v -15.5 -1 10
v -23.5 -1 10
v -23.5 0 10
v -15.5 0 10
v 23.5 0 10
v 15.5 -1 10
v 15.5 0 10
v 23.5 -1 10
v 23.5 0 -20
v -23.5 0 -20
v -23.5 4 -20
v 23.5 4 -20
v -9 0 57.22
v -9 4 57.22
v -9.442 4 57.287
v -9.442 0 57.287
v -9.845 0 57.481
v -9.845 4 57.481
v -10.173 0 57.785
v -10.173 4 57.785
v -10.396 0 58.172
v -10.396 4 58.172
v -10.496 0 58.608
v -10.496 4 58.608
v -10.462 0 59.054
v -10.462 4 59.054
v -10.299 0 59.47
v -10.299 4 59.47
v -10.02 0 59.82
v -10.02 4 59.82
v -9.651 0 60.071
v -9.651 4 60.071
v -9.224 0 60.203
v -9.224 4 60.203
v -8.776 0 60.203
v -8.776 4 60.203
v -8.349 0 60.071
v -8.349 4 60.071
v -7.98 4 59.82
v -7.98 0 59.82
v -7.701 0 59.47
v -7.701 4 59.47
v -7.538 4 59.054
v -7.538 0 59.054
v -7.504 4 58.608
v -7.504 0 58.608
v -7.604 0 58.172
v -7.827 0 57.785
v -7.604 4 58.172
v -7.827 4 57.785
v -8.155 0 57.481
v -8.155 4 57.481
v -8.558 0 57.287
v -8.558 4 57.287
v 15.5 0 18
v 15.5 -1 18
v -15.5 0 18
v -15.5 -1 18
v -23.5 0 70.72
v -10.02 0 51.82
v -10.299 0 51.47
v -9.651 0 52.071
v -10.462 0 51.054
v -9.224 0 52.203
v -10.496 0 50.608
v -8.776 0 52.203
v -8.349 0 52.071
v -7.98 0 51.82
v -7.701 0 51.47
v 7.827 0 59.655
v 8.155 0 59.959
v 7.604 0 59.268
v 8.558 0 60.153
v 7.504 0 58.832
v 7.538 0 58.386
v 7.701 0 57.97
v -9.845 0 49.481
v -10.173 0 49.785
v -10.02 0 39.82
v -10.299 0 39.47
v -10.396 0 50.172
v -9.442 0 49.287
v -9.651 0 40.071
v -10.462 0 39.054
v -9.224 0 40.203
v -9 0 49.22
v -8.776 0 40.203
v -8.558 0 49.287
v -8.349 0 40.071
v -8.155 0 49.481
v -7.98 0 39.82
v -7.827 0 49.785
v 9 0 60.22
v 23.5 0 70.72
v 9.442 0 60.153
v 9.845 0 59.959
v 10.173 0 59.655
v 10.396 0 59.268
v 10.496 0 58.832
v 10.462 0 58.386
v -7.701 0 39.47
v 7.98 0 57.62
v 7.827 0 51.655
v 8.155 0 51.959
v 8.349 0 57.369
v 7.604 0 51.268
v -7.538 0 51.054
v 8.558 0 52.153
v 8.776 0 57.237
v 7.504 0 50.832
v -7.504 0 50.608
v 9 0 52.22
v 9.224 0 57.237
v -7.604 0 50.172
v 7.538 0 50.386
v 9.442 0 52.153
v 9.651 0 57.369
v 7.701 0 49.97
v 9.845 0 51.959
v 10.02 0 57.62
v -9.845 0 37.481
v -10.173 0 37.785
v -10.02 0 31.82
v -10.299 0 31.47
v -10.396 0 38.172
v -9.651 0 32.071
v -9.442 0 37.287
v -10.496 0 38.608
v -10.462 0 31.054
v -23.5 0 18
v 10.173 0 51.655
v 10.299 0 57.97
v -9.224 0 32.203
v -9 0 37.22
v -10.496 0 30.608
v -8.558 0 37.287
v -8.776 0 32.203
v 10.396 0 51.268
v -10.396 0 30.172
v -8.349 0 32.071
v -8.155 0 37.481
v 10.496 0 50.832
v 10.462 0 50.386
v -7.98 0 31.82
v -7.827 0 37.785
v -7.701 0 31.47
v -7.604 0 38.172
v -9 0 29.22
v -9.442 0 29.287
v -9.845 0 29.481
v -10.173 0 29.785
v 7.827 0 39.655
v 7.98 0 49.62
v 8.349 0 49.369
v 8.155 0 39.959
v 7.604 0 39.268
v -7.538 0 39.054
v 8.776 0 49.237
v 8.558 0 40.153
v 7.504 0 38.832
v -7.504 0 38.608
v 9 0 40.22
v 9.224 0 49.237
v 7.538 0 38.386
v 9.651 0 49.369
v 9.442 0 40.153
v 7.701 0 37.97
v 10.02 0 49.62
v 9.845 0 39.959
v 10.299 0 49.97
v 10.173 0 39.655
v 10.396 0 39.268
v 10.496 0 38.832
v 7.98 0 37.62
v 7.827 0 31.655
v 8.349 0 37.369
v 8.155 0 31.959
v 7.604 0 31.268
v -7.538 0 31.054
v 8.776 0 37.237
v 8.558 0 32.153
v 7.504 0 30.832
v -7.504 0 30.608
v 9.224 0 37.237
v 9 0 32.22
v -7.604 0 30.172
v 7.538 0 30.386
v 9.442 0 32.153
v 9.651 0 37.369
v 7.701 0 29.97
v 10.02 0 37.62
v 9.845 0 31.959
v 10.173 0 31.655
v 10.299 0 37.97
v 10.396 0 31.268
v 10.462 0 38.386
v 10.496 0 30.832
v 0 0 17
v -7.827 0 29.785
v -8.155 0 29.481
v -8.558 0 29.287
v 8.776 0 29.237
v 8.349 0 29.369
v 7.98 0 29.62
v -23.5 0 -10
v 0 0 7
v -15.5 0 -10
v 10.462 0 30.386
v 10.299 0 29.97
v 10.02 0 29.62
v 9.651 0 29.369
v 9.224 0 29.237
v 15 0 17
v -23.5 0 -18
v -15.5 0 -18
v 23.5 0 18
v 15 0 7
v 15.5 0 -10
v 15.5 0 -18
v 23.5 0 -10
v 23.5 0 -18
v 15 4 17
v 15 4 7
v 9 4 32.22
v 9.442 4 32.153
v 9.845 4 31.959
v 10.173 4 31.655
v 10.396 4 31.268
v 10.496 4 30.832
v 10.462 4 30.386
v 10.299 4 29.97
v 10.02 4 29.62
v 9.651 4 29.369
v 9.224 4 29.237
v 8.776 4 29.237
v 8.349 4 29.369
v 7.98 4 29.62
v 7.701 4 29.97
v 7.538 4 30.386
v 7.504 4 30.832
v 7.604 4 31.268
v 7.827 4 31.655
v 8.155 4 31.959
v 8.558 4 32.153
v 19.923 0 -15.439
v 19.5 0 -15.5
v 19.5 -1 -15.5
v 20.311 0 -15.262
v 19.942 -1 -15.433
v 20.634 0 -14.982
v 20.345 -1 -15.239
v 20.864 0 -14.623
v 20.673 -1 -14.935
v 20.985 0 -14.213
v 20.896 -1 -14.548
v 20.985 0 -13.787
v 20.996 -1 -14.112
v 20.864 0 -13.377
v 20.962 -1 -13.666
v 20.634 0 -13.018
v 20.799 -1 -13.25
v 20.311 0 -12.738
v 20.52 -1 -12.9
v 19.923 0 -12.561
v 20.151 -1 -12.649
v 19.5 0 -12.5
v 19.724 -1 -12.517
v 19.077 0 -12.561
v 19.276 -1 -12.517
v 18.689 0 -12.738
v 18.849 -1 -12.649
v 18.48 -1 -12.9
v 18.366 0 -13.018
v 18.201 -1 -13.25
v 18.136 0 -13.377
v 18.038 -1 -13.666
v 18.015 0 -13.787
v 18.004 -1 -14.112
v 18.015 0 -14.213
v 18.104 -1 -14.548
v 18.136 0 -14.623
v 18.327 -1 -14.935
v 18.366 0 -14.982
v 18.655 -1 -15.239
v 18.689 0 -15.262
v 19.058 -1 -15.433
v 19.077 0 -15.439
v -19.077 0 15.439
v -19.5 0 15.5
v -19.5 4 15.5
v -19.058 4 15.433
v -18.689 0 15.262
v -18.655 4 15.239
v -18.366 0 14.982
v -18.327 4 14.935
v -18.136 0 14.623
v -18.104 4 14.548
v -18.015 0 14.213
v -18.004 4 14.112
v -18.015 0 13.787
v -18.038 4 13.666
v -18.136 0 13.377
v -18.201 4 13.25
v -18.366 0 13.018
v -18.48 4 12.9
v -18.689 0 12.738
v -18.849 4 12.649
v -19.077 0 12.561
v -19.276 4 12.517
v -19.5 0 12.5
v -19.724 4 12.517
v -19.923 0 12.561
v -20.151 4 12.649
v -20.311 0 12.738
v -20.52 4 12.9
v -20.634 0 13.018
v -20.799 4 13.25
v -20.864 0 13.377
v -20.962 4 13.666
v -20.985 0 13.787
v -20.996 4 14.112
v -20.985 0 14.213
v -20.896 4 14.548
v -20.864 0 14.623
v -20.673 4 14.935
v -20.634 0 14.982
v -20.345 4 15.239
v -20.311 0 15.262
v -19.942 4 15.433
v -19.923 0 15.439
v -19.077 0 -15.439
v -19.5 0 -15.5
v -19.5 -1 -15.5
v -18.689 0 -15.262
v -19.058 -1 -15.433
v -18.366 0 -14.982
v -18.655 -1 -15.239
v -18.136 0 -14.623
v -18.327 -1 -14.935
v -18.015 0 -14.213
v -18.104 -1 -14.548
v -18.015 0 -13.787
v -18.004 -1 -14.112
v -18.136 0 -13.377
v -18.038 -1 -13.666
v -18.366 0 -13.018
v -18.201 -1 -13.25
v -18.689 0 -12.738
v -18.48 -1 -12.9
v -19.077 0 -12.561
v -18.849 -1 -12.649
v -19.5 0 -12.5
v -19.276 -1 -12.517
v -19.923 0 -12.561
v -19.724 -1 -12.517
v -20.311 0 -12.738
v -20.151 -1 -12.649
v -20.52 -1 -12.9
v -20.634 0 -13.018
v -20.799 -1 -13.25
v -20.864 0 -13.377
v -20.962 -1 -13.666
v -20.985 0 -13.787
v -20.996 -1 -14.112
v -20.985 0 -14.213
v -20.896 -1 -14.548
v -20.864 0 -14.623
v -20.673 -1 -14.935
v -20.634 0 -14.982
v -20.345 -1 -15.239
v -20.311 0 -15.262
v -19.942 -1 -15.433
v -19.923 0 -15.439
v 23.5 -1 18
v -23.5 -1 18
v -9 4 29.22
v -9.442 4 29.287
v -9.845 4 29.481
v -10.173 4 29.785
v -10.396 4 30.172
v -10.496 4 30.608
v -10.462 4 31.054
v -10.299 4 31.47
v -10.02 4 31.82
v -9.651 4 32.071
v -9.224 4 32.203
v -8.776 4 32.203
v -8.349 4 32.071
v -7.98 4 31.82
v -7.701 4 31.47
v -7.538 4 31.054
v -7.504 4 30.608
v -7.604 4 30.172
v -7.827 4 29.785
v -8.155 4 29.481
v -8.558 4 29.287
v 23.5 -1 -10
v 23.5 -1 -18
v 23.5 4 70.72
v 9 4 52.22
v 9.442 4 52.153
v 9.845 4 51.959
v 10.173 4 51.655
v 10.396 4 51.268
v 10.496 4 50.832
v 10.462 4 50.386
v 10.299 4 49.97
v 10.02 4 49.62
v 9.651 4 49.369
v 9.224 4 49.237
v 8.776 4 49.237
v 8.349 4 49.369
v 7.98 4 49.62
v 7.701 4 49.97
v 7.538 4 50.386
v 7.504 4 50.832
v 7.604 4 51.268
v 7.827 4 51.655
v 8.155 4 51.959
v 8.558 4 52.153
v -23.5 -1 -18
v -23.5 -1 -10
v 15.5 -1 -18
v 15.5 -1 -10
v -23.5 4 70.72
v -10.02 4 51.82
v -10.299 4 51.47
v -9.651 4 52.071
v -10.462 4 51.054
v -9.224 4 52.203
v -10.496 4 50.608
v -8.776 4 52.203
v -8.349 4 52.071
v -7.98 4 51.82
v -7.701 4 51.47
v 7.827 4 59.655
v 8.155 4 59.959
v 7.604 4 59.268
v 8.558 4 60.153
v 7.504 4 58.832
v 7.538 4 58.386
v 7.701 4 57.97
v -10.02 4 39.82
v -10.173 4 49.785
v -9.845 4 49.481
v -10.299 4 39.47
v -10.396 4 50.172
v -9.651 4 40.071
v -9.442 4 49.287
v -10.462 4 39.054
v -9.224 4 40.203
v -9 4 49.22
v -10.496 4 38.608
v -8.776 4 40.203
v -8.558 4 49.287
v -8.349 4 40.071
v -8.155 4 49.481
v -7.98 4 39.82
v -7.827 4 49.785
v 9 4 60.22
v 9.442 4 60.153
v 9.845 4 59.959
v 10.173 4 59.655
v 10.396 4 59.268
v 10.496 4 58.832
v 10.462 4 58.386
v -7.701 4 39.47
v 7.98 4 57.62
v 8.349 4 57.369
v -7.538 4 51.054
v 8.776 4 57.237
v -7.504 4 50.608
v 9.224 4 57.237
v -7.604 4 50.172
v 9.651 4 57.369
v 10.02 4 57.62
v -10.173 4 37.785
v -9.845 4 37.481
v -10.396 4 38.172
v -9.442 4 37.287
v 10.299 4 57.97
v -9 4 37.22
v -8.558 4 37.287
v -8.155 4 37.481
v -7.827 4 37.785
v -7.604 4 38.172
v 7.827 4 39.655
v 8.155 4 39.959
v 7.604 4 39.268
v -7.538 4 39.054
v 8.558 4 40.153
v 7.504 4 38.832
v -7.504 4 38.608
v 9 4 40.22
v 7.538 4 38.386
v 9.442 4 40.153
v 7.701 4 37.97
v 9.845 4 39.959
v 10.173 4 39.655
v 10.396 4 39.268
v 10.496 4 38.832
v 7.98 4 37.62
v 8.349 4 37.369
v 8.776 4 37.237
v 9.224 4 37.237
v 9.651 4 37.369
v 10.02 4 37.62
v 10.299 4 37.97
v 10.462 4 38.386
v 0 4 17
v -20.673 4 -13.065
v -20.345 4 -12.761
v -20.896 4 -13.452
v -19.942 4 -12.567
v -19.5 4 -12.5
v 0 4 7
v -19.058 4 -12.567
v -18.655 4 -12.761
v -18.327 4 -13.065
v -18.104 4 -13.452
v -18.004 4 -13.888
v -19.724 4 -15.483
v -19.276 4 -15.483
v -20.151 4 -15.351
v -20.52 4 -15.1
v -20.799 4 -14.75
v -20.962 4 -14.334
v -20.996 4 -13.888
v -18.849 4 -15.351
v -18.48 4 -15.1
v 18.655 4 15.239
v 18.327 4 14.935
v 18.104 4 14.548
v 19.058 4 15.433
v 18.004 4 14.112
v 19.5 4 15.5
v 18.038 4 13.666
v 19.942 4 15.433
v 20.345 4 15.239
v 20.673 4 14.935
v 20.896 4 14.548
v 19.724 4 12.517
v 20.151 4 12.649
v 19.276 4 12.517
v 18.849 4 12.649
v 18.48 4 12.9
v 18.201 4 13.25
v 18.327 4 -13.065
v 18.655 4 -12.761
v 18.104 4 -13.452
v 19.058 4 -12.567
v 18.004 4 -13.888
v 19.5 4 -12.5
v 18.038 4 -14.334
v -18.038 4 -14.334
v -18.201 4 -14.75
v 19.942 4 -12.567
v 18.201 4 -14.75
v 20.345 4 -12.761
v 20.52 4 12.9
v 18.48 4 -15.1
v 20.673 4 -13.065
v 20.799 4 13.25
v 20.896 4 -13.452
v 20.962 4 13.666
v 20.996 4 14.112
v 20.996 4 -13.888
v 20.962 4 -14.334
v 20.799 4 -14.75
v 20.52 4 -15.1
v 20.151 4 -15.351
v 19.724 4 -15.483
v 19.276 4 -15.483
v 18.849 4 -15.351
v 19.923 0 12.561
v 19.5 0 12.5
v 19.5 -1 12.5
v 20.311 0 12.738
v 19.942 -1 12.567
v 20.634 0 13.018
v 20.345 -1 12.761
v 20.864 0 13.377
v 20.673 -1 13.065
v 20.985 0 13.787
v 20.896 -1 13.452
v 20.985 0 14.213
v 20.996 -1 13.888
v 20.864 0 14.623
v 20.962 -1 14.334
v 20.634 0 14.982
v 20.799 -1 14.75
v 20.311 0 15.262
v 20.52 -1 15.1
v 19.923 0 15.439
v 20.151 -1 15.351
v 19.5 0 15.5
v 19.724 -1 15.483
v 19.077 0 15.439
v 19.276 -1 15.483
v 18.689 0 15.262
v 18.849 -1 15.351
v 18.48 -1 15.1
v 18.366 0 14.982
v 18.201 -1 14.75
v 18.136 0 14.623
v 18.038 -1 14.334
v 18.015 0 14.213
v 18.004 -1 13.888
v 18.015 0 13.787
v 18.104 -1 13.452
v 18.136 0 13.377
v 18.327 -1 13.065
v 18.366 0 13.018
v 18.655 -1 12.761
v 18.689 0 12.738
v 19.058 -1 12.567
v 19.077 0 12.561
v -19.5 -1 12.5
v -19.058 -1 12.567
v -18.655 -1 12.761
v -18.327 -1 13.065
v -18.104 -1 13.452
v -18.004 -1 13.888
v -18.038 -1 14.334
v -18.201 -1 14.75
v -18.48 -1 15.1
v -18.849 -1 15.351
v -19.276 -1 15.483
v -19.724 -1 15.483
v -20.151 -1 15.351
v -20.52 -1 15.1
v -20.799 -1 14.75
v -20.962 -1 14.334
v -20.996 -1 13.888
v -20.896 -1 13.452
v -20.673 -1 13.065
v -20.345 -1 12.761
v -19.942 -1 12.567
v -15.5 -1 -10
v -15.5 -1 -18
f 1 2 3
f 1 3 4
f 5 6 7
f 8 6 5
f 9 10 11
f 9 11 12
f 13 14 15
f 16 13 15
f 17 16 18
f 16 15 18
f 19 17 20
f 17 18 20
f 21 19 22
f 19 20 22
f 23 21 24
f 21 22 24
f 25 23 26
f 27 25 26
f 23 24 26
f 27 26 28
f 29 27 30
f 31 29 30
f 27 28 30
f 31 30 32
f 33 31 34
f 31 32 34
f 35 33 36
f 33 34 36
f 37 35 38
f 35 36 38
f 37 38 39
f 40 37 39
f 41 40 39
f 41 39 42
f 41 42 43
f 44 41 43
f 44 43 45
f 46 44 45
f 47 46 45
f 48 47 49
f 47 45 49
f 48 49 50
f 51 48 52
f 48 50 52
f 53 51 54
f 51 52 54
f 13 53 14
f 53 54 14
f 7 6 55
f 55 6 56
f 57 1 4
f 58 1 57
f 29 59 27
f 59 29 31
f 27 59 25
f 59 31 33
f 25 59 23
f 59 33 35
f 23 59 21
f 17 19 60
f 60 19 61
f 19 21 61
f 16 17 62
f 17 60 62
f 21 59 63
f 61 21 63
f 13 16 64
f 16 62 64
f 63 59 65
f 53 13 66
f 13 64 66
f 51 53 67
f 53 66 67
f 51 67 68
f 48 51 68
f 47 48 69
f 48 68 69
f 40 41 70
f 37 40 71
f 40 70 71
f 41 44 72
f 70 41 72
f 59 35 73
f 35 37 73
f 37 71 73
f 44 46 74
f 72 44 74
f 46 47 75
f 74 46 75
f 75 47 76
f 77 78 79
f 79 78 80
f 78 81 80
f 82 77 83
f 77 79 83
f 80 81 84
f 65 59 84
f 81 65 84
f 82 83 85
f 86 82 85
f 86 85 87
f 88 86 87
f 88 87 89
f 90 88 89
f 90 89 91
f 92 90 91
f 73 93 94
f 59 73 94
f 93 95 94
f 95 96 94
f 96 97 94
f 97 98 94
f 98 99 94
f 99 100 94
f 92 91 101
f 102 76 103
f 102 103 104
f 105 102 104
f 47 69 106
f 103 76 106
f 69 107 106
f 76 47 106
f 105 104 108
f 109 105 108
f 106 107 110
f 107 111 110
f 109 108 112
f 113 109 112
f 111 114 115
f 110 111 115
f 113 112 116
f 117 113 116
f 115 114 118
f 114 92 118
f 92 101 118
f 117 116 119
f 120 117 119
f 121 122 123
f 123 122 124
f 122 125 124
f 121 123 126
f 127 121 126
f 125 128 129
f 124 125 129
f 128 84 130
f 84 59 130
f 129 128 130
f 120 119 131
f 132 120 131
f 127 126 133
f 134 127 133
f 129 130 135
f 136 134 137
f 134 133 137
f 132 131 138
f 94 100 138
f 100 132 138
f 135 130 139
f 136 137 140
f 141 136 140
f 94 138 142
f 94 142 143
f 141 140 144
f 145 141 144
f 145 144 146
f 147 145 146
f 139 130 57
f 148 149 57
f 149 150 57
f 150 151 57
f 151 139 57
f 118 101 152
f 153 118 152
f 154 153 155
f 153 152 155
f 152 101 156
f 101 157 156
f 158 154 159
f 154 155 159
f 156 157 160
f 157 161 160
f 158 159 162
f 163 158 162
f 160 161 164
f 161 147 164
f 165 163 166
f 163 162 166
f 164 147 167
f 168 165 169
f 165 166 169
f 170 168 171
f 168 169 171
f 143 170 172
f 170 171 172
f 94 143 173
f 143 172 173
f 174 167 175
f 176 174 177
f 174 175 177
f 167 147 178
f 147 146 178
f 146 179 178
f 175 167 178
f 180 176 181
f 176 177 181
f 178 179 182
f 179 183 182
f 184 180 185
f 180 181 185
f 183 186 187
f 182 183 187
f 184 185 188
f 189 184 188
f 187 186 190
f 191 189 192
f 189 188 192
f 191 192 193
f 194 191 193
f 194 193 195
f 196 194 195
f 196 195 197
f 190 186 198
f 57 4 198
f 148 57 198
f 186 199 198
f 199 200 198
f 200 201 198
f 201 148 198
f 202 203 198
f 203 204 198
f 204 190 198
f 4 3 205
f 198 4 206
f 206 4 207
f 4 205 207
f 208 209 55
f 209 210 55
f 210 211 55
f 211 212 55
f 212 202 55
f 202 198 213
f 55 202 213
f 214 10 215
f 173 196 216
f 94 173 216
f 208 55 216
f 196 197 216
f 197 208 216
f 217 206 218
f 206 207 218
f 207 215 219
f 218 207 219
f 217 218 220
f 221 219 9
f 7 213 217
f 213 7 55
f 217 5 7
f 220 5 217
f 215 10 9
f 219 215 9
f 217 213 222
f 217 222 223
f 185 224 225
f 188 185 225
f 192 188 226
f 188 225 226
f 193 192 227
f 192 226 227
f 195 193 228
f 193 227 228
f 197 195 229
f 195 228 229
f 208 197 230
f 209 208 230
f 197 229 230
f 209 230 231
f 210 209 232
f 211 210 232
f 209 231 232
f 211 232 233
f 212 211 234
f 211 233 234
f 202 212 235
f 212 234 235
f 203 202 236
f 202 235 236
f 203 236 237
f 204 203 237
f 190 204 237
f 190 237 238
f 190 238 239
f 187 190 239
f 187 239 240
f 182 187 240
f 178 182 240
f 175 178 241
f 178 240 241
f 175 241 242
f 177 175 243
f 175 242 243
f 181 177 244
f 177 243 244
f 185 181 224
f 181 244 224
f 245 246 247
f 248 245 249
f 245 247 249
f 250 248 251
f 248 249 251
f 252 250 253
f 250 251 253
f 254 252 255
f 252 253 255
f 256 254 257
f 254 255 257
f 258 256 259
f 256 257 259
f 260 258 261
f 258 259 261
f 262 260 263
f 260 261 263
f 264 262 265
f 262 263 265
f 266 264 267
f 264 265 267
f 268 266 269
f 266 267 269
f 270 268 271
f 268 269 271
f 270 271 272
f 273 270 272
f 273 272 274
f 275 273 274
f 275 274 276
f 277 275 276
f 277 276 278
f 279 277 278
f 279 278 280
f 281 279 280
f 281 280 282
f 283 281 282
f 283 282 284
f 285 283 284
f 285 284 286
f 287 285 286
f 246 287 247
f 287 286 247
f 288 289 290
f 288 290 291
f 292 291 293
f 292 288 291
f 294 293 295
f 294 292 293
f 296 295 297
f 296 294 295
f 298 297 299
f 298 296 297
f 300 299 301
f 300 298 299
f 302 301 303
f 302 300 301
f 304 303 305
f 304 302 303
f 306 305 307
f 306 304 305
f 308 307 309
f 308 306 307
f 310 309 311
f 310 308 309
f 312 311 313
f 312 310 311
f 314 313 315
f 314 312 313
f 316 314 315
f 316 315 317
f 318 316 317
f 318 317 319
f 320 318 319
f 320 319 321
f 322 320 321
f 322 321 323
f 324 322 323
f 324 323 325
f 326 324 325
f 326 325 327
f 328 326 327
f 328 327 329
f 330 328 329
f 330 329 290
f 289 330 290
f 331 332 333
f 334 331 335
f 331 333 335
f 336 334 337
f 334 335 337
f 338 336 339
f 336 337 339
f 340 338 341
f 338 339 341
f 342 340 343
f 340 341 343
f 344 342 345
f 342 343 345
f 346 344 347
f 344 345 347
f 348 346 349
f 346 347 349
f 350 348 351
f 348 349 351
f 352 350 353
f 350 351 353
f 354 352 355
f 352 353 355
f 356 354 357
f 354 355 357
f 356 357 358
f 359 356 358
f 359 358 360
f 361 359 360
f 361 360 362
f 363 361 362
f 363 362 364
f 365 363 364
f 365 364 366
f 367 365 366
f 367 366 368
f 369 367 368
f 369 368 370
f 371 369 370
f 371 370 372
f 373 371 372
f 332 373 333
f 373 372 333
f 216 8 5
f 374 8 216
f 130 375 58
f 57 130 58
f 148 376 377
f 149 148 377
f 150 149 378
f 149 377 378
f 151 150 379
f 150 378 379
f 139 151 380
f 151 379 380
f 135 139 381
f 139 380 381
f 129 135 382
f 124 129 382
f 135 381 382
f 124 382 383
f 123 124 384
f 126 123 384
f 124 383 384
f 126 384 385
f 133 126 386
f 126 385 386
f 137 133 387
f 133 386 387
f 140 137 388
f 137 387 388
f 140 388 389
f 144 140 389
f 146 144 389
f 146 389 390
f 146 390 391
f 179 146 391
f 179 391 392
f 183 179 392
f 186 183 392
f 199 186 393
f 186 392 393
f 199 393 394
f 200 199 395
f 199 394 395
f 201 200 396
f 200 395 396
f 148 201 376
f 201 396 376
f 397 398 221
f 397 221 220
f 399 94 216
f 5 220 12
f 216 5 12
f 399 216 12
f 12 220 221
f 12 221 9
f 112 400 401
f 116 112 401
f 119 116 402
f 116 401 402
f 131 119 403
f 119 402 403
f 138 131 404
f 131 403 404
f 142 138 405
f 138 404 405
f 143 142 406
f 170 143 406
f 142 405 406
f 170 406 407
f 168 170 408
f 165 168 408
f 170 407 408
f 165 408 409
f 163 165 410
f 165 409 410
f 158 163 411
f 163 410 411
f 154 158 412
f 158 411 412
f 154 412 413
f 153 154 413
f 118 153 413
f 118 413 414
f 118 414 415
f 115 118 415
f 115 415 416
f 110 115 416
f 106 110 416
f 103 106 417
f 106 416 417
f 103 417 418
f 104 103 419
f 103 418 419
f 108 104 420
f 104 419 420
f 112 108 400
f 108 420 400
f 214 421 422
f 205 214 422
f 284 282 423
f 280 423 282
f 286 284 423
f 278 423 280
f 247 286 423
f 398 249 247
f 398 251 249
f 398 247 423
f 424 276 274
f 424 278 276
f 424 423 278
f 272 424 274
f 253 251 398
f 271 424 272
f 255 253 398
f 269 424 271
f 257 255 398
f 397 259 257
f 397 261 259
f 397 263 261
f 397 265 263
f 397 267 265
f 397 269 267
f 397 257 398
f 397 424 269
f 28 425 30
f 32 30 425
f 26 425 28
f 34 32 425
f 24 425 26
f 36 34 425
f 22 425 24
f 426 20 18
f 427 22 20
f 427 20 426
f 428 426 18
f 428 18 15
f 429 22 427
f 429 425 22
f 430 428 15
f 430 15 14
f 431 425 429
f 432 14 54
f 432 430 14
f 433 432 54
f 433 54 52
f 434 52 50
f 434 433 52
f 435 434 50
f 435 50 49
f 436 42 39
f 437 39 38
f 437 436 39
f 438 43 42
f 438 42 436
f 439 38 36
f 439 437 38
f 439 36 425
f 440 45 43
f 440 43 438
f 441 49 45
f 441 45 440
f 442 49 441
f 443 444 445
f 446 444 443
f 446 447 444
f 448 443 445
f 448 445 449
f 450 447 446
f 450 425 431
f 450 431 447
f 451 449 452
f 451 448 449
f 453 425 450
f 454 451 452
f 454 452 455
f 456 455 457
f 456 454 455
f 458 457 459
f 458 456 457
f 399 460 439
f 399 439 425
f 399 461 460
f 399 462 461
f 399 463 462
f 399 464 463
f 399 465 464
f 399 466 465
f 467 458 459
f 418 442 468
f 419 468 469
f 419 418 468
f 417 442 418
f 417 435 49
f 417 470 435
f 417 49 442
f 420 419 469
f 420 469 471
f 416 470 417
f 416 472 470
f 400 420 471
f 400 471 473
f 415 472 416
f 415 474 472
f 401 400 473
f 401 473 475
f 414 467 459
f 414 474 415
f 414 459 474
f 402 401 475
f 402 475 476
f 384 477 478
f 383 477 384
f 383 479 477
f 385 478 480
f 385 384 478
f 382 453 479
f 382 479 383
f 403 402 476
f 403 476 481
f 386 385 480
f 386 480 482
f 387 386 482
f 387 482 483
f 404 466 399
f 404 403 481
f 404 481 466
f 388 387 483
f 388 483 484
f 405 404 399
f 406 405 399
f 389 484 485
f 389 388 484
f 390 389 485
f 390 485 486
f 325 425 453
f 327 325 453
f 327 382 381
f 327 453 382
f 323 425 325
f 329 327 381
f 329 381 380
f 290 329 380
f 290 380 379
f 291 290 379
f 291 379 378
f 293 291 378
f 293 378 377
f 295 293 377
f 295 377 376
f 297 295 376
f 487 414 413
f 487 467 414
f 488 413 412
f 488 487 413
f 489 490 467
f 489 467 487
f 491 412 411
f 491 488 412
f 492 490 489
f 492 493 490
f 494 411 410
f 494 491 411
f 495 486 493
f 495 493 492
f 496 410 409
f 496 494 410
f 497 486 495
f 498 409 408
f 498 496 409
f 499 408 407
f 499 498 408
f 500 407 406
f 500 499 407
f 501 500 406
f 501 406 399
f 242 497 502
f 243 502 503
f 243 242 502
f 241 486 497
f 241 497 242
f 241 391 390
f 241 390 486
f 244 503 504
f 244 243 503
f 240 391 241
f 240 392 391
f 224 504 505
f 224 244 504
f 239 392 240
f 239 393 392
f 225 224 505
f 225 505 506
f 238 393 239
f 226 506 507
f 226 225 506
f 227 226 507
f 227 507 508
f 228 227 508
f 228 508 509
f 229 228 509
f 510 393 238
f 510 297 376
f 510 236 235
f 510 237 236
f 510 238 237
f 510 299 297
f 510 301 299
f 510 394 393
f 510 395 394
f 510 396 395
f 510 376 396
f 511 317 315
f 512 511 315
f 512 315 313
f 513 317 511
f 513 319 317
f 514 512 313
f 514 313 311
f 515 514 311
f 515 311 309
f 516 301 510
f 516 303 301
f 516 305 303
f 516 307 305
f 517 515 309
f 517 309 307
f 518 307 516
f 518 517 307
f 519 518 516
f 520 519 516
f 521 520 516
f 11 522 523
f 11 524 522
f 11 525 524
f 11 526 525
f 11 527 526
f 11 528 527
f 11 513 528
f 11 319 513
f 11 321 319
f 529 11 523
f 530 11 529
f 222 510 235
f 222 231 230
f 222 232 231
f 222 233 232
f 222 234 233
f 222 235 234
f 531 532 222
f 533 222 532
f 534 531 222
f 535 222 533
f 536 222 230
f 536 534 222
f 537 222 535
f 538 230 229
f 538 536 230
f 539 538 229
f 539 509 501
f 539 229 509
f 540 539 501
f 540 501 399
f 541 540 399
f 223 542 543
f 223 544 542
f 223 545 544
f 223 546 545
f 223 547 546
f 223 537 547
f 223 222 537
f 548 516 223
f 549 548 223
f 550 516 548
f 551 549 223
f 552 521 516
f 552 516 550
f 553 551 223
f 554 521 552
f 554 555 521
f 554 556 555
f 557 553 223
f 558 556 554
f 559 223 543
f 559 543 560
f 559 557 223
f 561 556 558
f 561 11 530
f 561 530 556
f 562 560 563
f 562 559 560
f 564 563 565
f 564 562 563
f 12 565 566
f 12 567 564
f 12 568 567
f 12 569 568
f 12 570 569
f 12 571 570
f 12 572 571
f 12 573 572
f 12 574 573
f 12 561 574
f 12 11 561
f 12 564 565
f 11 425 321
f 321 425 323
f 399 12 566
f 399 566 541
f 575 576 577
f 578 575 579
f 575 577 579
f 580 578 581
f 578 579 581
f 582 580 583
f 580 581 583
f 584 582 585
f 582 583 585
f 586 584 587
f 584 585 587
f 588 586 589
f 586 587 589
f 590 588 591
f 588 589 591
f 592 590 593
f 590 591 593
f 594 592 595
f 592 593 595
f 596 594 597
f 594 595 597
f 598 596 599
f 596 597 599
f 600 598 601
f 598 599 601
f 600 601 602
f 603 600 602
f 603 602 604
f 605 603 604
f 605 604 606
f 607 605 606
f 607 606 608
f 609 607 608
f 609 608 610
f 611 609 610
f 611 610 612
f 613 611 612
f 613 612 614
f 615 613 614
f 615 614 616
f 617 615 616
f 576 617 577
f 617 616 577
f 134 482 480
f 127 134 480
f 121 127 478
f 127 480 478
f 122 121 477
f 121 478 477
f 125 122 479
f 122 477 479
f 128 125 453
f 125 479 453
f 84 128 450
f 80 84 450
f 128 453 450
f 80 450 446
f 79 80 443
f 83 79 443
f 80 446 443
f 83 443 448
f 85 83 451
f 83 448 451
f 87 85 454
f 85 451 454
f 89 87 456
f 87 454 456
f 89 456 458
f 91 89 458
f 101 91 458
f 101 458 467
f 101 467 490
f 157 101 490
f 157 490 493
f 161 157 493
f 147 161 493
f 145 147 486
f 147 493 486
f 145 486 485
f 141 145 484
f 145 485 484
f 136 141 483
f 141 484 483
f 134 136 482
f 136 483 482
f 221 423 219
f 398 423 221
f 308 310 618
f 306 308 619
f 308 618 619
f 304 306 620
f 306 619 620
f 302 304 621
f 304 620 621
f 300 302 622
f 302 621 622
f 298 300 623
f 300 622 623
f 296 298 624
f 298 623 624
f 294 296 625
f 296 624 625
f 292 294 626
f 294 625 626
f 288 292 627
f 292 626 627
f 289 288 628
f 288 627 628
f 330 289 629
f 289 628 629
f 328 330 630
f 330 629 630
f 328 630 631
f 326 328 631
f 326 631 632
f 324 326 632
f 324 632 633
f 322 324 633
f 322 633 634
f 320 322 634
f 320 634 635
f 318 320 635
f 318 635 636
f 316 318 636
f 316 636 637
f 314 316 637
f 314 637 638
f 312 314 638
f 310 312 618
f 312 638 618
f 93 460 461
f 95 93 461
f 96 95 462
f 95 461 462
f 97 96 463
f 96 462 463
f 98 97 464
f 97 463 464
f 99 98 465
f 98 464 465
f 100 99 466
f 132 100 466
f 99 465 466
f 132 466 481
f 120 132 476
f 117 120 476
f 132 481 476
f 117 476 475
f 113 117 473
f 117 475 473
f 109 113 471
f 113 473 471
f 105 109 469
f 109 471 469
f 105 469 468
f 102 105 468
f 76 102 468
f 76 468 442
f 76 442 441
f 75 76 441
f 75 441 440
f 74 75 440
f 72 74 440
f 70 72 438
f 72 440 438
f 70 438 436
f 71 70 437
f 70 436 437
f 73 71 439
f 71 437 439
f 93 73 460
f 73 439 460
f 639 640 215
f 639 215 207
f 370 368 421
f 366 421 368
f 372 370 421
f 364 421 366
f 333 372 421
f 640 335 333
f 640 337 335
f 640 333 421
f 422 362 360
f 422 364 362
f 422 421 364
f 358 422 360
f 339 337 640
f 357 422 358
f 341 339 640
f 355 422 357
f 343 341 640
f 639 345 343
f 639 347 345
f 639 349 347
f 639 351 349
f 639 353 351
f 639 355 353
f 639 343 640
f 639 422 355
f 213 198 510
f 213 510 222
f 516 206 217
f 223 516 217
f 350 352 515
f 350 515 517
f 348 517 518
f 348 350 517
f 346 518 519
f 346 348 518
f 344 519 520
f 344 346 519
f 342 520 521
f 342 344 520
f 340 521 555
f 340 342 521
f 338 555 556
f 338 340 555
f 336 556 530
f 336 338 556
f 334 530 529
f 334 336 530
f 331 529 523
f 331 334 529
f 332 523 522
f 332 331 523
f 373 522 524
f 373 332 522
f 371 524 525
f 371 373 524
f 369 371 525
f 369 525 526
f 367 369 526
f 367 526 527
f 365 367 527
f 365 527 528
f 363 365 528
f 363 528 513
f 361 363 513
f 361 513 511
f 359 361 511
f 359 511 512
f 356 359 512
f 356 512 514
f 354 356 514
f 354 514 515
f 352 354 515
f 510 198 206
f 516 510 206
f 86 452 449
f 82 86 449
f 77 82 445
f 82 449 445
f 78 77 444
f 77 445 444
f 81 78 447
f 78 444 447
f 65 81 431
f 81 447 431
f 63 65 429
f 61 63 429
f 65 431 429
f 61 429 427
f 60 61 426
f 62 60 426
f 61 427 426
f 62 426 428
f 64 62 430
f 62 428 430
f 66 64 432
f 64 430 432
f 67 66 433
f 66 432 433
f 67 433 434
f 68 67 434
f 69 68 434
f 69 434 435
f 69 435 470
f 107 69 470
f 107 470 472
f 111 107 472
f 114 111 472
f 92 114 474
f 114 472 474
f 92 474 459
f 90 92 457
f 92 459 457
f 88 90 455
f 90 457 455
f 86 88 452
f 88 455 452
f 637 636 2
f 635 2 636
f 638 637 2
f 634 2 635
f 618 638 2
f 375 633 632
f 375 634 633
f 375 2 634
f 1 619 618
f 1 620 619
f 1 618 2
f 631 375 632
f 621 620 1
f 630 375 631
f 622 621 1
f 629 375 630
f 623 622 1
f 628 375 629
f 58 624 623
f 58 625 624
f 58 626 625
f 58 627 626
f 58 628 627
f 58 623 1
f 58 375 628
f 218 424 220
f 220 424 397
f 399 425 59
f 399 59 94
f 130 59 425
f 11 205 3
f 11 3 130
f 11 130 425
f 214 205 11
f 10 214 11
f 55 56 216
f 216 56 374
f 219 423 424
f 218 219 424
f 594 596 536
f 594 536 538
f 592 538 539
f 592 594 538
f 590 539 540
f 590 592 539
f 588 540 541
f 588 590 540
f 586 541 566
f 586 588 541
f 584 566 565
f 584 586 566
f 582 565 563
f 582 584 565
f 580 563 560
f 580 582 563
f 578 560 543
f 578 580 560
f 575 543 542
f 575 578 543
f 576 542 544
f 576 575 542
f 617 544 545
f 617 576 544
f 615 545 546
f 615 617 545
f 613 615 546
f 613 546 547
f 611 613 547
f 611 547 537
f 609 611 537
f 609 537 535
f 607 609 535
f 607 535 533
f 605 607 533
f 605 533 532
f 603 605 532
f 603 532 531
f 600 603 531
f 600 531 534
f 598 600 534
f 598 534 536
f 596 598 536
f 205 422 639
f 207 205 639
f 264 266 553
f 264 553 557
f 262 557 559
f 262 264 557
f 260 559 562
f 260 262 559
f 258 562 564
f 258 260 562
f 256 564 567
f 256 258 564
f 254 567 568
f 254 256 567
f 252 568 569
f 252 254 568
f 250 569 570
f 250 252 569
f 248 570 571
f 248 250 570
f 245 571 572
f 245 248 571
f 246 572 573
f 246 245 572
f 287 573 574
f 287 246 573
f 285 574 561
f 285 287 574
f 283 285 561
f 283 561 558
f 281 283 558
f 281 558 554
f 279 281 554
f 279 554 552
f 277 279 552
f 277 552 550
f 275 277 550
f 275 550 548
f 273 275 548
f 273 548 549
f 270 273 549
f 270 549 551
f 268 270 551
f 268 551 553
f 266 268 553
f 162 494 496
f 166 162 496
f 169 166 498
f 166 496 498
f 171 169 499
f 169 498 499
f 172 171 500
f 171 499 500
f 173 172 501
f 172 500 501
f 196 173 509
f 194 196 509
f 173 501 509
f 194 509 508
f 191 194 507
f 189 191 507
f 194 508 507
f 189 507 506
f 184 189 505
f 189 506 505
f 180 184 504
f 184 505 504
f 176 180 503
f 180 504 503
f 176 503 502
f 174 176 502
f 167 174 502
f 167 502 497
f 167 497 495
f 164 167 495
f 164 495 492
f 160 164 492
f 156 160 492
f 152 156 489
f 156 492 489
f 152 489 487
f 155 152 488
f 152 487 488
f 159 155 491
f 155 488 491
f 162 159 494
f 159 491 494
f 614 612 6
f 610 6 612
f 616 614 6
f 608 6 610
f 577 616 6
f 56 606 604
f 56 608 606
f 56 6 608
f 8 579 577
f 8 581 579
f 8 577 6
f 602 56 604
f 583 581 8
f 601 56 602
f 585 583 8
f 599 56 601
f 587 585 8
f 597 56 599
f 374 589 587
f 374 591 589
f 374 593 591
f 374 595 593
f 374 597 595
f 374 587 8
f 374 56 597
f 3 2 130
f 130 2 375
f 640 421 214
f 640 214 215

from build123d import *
from build123d.topology import SkipClean

# Parameters (mm, degrees)
SKETCH_1_W          = 47
SKETCH_1_H          = 40
SKETCH_1_R          = 1.5
SKETCH_1_W_2        = 30
SKETCH_1_H_2        = 10
SKETCH_1_H_3        = 55.72
SKETCH_1_W_3        = 15
EXTRUDE_1_DEPTH     = 4
EXTRUDE_START       = 1
SKETCH_3_W          = 8
SKETCH_3_H          = 8
SKETCH_3_R          = 1.5
EXTRUDE_2_DEPTH     = 1
SKETCH_4_R          = 1.5
SKETCH_4_W          = 47
SKETCH_4_H          = 5
CUT_EXTRUDE_2_DEPTH = 4


with BuildPart() as part:
    # 草图1 → 凸台-拉伸1 (new body)
    # profile 1 of 3: a face of its own
    with BuildSketch(Plane(origin=(0, 0, 0), x_dir=(1, 0, 0), z_dir=(0, 1, 0))):
        Rectangle(SKETCH_1_W, SKETCH_1_H)
        with Locations(Location((19.5, -14, 0), (0, 0, 270))):
            Circle(SKETCH_1_R, mode=Mode.SUBTRACT)
        with Locations(Location((19.5, 14, 0), (0, 0, 270))):
            Circle(SKETCH_1_R, mode=Mode.SUBTRACT)
        with Locations(Location((-19.5, -14, 0), (0, 0, 270))):
            Circle(SKETCH_1_R, mode=Mode.SUBTRACT)
        with Locations(Location((-19.5, 14, 0), (0, 0, 270))):
            Circle(SKETCH_1_R, mode=Mode.SUBTRACT)
        with Locations((0, -12)):
            Rectangle(SKETCH_1_W_2, SKETCH_1_H_2, mode=Mode.SUBTRACT)
    # profile 2 of 3: a face of its own
    with BuildSketch(Plane(origin=(0, 0, 0), x_dir=(1, 0, 0), z_dir=(0, 1, 0))):
        with Locations((0, -47.86)):
            Rectangle(SKETCH_1_W, SKETCH_1_H_3)
    # profile 3 of 3: a face of its own
    with BuildSketch(Plane(origin=(0, 0, 0), x_dir=(1, 0, 0), z_dir=(0, 1, 0))):
        with Locations((-7.5, -12)):
            Rectangle(SKETCH_1_W_3, SKETCH_1_H_2)
    extrude(amount=EXTRUDE_1_DEPTH)

    # 草图3 → 凸台-拉伸2 (add)
    # profile 1 of 4: a face of its own
    with SkipClean():  # the faces are left unmerged after this step: merging them gives an invalid solid
        with BuildSketch(Plane.XZ.offset(EXTRUDE_START)):
            with Locations((19.5, -14)):
                Rectangle(SKETCH_3_W, SKETCH_3_H)
            with Locations(Location((19.5, -14, 0), (0, 0, 270))):
                Circle(SKETCH_3_R, mode=Mode.SUBTRACT)
        # profile 2 of 4: a face of its own
        with BuildSketch(Plane.XZ.offset(EXTRUDE_START)):
            with Locations((19.5, 14)):
                Rectangle(SKETCH_3_W, SKETCH_3_H)
            with Locations(Location((19.5, 14, 0), (0, 0, 270))):
                Circle(SKETCH_3_R, mode=Mode.SUBTRACT)
        # profile 3 of 4: a face of its own
        with BuildSketch(Plane.XZ.offset(EXTRUDE_START)):
            with Locations((-19.5, -14)):
                Rectangle(SKETCH_3_W, SKETCH_3_H)
            with Locations(Location((-19.5, -14, 0), (0, 0, 270))):
                Circle(SKETCH_3_R, mode=Mode.SUBTRACT)
        # profile 4 of 4: a face of its own
        with BuildSketch(Plane.XZ.offset(EXTRUDE_START)):
            with Locations((-19.5, 14)):
                Rectangle(SKETCH_3_W, SKETCH_3_H)
            with Locations(Location((-19.5, 14, 0), (0, 0, 270))):
                Circle(SKETCH_3_R, mode=Mode.SUBTRACT)
        extrude(amount=-EXTRUDE_2_DEPTH)

    # 草图4 → 切除-拉伸2 (cut)
    with SkipClean():  # the faces are left unmerged after this step: merging them gives an invalid solid
        with BuildSketch(Plane(origin=(0, 4, 0), x_dir=(1, 0, 0), z_dir=(0, 1, 0))):
            with Locations(Location((9, -30.72, 0), (0, 0, 270))):
                Circle(SKETCH_4_R)
            with Locations(Location((9, -50.72, 0), (0, 0, 270))):
                Circle(SKETCH_4_R)
            with Locations(Location((-9, -50.72, 0), (0, 0, 90))):
                Circle(SKETCH_4_R)
            with Locations(Location((-9, -30.72, 0), (0, 0, 90))):
                Circle(SKETCH_4_R)
            with Locations(Location((-9, -38.72, 0), (0, 0, 90))):
                Circle(SKETCH_4_R)
            with Locations(Location((9, -38.72, 0), (0, 0, 270))):
                Circle(SKETCH_4_R)
            with Locations(Location((9, -58.72, 0), (0, 0, 270))):
                Circle(SKETCH_4_R)
            with Locations(Location((-9, -58.72, 0), (0, 0, 90))):
                Circle(SKETCH_4_R)
            with Locations((0, -73.22)):
                Rectangle(SKETCH_4_W, SKETCH_4_H)
        extrude(amount=-CUT_EXTRUDE_2_DEPTH, mode=Mode.SUBTRACT)


solid = part.part
